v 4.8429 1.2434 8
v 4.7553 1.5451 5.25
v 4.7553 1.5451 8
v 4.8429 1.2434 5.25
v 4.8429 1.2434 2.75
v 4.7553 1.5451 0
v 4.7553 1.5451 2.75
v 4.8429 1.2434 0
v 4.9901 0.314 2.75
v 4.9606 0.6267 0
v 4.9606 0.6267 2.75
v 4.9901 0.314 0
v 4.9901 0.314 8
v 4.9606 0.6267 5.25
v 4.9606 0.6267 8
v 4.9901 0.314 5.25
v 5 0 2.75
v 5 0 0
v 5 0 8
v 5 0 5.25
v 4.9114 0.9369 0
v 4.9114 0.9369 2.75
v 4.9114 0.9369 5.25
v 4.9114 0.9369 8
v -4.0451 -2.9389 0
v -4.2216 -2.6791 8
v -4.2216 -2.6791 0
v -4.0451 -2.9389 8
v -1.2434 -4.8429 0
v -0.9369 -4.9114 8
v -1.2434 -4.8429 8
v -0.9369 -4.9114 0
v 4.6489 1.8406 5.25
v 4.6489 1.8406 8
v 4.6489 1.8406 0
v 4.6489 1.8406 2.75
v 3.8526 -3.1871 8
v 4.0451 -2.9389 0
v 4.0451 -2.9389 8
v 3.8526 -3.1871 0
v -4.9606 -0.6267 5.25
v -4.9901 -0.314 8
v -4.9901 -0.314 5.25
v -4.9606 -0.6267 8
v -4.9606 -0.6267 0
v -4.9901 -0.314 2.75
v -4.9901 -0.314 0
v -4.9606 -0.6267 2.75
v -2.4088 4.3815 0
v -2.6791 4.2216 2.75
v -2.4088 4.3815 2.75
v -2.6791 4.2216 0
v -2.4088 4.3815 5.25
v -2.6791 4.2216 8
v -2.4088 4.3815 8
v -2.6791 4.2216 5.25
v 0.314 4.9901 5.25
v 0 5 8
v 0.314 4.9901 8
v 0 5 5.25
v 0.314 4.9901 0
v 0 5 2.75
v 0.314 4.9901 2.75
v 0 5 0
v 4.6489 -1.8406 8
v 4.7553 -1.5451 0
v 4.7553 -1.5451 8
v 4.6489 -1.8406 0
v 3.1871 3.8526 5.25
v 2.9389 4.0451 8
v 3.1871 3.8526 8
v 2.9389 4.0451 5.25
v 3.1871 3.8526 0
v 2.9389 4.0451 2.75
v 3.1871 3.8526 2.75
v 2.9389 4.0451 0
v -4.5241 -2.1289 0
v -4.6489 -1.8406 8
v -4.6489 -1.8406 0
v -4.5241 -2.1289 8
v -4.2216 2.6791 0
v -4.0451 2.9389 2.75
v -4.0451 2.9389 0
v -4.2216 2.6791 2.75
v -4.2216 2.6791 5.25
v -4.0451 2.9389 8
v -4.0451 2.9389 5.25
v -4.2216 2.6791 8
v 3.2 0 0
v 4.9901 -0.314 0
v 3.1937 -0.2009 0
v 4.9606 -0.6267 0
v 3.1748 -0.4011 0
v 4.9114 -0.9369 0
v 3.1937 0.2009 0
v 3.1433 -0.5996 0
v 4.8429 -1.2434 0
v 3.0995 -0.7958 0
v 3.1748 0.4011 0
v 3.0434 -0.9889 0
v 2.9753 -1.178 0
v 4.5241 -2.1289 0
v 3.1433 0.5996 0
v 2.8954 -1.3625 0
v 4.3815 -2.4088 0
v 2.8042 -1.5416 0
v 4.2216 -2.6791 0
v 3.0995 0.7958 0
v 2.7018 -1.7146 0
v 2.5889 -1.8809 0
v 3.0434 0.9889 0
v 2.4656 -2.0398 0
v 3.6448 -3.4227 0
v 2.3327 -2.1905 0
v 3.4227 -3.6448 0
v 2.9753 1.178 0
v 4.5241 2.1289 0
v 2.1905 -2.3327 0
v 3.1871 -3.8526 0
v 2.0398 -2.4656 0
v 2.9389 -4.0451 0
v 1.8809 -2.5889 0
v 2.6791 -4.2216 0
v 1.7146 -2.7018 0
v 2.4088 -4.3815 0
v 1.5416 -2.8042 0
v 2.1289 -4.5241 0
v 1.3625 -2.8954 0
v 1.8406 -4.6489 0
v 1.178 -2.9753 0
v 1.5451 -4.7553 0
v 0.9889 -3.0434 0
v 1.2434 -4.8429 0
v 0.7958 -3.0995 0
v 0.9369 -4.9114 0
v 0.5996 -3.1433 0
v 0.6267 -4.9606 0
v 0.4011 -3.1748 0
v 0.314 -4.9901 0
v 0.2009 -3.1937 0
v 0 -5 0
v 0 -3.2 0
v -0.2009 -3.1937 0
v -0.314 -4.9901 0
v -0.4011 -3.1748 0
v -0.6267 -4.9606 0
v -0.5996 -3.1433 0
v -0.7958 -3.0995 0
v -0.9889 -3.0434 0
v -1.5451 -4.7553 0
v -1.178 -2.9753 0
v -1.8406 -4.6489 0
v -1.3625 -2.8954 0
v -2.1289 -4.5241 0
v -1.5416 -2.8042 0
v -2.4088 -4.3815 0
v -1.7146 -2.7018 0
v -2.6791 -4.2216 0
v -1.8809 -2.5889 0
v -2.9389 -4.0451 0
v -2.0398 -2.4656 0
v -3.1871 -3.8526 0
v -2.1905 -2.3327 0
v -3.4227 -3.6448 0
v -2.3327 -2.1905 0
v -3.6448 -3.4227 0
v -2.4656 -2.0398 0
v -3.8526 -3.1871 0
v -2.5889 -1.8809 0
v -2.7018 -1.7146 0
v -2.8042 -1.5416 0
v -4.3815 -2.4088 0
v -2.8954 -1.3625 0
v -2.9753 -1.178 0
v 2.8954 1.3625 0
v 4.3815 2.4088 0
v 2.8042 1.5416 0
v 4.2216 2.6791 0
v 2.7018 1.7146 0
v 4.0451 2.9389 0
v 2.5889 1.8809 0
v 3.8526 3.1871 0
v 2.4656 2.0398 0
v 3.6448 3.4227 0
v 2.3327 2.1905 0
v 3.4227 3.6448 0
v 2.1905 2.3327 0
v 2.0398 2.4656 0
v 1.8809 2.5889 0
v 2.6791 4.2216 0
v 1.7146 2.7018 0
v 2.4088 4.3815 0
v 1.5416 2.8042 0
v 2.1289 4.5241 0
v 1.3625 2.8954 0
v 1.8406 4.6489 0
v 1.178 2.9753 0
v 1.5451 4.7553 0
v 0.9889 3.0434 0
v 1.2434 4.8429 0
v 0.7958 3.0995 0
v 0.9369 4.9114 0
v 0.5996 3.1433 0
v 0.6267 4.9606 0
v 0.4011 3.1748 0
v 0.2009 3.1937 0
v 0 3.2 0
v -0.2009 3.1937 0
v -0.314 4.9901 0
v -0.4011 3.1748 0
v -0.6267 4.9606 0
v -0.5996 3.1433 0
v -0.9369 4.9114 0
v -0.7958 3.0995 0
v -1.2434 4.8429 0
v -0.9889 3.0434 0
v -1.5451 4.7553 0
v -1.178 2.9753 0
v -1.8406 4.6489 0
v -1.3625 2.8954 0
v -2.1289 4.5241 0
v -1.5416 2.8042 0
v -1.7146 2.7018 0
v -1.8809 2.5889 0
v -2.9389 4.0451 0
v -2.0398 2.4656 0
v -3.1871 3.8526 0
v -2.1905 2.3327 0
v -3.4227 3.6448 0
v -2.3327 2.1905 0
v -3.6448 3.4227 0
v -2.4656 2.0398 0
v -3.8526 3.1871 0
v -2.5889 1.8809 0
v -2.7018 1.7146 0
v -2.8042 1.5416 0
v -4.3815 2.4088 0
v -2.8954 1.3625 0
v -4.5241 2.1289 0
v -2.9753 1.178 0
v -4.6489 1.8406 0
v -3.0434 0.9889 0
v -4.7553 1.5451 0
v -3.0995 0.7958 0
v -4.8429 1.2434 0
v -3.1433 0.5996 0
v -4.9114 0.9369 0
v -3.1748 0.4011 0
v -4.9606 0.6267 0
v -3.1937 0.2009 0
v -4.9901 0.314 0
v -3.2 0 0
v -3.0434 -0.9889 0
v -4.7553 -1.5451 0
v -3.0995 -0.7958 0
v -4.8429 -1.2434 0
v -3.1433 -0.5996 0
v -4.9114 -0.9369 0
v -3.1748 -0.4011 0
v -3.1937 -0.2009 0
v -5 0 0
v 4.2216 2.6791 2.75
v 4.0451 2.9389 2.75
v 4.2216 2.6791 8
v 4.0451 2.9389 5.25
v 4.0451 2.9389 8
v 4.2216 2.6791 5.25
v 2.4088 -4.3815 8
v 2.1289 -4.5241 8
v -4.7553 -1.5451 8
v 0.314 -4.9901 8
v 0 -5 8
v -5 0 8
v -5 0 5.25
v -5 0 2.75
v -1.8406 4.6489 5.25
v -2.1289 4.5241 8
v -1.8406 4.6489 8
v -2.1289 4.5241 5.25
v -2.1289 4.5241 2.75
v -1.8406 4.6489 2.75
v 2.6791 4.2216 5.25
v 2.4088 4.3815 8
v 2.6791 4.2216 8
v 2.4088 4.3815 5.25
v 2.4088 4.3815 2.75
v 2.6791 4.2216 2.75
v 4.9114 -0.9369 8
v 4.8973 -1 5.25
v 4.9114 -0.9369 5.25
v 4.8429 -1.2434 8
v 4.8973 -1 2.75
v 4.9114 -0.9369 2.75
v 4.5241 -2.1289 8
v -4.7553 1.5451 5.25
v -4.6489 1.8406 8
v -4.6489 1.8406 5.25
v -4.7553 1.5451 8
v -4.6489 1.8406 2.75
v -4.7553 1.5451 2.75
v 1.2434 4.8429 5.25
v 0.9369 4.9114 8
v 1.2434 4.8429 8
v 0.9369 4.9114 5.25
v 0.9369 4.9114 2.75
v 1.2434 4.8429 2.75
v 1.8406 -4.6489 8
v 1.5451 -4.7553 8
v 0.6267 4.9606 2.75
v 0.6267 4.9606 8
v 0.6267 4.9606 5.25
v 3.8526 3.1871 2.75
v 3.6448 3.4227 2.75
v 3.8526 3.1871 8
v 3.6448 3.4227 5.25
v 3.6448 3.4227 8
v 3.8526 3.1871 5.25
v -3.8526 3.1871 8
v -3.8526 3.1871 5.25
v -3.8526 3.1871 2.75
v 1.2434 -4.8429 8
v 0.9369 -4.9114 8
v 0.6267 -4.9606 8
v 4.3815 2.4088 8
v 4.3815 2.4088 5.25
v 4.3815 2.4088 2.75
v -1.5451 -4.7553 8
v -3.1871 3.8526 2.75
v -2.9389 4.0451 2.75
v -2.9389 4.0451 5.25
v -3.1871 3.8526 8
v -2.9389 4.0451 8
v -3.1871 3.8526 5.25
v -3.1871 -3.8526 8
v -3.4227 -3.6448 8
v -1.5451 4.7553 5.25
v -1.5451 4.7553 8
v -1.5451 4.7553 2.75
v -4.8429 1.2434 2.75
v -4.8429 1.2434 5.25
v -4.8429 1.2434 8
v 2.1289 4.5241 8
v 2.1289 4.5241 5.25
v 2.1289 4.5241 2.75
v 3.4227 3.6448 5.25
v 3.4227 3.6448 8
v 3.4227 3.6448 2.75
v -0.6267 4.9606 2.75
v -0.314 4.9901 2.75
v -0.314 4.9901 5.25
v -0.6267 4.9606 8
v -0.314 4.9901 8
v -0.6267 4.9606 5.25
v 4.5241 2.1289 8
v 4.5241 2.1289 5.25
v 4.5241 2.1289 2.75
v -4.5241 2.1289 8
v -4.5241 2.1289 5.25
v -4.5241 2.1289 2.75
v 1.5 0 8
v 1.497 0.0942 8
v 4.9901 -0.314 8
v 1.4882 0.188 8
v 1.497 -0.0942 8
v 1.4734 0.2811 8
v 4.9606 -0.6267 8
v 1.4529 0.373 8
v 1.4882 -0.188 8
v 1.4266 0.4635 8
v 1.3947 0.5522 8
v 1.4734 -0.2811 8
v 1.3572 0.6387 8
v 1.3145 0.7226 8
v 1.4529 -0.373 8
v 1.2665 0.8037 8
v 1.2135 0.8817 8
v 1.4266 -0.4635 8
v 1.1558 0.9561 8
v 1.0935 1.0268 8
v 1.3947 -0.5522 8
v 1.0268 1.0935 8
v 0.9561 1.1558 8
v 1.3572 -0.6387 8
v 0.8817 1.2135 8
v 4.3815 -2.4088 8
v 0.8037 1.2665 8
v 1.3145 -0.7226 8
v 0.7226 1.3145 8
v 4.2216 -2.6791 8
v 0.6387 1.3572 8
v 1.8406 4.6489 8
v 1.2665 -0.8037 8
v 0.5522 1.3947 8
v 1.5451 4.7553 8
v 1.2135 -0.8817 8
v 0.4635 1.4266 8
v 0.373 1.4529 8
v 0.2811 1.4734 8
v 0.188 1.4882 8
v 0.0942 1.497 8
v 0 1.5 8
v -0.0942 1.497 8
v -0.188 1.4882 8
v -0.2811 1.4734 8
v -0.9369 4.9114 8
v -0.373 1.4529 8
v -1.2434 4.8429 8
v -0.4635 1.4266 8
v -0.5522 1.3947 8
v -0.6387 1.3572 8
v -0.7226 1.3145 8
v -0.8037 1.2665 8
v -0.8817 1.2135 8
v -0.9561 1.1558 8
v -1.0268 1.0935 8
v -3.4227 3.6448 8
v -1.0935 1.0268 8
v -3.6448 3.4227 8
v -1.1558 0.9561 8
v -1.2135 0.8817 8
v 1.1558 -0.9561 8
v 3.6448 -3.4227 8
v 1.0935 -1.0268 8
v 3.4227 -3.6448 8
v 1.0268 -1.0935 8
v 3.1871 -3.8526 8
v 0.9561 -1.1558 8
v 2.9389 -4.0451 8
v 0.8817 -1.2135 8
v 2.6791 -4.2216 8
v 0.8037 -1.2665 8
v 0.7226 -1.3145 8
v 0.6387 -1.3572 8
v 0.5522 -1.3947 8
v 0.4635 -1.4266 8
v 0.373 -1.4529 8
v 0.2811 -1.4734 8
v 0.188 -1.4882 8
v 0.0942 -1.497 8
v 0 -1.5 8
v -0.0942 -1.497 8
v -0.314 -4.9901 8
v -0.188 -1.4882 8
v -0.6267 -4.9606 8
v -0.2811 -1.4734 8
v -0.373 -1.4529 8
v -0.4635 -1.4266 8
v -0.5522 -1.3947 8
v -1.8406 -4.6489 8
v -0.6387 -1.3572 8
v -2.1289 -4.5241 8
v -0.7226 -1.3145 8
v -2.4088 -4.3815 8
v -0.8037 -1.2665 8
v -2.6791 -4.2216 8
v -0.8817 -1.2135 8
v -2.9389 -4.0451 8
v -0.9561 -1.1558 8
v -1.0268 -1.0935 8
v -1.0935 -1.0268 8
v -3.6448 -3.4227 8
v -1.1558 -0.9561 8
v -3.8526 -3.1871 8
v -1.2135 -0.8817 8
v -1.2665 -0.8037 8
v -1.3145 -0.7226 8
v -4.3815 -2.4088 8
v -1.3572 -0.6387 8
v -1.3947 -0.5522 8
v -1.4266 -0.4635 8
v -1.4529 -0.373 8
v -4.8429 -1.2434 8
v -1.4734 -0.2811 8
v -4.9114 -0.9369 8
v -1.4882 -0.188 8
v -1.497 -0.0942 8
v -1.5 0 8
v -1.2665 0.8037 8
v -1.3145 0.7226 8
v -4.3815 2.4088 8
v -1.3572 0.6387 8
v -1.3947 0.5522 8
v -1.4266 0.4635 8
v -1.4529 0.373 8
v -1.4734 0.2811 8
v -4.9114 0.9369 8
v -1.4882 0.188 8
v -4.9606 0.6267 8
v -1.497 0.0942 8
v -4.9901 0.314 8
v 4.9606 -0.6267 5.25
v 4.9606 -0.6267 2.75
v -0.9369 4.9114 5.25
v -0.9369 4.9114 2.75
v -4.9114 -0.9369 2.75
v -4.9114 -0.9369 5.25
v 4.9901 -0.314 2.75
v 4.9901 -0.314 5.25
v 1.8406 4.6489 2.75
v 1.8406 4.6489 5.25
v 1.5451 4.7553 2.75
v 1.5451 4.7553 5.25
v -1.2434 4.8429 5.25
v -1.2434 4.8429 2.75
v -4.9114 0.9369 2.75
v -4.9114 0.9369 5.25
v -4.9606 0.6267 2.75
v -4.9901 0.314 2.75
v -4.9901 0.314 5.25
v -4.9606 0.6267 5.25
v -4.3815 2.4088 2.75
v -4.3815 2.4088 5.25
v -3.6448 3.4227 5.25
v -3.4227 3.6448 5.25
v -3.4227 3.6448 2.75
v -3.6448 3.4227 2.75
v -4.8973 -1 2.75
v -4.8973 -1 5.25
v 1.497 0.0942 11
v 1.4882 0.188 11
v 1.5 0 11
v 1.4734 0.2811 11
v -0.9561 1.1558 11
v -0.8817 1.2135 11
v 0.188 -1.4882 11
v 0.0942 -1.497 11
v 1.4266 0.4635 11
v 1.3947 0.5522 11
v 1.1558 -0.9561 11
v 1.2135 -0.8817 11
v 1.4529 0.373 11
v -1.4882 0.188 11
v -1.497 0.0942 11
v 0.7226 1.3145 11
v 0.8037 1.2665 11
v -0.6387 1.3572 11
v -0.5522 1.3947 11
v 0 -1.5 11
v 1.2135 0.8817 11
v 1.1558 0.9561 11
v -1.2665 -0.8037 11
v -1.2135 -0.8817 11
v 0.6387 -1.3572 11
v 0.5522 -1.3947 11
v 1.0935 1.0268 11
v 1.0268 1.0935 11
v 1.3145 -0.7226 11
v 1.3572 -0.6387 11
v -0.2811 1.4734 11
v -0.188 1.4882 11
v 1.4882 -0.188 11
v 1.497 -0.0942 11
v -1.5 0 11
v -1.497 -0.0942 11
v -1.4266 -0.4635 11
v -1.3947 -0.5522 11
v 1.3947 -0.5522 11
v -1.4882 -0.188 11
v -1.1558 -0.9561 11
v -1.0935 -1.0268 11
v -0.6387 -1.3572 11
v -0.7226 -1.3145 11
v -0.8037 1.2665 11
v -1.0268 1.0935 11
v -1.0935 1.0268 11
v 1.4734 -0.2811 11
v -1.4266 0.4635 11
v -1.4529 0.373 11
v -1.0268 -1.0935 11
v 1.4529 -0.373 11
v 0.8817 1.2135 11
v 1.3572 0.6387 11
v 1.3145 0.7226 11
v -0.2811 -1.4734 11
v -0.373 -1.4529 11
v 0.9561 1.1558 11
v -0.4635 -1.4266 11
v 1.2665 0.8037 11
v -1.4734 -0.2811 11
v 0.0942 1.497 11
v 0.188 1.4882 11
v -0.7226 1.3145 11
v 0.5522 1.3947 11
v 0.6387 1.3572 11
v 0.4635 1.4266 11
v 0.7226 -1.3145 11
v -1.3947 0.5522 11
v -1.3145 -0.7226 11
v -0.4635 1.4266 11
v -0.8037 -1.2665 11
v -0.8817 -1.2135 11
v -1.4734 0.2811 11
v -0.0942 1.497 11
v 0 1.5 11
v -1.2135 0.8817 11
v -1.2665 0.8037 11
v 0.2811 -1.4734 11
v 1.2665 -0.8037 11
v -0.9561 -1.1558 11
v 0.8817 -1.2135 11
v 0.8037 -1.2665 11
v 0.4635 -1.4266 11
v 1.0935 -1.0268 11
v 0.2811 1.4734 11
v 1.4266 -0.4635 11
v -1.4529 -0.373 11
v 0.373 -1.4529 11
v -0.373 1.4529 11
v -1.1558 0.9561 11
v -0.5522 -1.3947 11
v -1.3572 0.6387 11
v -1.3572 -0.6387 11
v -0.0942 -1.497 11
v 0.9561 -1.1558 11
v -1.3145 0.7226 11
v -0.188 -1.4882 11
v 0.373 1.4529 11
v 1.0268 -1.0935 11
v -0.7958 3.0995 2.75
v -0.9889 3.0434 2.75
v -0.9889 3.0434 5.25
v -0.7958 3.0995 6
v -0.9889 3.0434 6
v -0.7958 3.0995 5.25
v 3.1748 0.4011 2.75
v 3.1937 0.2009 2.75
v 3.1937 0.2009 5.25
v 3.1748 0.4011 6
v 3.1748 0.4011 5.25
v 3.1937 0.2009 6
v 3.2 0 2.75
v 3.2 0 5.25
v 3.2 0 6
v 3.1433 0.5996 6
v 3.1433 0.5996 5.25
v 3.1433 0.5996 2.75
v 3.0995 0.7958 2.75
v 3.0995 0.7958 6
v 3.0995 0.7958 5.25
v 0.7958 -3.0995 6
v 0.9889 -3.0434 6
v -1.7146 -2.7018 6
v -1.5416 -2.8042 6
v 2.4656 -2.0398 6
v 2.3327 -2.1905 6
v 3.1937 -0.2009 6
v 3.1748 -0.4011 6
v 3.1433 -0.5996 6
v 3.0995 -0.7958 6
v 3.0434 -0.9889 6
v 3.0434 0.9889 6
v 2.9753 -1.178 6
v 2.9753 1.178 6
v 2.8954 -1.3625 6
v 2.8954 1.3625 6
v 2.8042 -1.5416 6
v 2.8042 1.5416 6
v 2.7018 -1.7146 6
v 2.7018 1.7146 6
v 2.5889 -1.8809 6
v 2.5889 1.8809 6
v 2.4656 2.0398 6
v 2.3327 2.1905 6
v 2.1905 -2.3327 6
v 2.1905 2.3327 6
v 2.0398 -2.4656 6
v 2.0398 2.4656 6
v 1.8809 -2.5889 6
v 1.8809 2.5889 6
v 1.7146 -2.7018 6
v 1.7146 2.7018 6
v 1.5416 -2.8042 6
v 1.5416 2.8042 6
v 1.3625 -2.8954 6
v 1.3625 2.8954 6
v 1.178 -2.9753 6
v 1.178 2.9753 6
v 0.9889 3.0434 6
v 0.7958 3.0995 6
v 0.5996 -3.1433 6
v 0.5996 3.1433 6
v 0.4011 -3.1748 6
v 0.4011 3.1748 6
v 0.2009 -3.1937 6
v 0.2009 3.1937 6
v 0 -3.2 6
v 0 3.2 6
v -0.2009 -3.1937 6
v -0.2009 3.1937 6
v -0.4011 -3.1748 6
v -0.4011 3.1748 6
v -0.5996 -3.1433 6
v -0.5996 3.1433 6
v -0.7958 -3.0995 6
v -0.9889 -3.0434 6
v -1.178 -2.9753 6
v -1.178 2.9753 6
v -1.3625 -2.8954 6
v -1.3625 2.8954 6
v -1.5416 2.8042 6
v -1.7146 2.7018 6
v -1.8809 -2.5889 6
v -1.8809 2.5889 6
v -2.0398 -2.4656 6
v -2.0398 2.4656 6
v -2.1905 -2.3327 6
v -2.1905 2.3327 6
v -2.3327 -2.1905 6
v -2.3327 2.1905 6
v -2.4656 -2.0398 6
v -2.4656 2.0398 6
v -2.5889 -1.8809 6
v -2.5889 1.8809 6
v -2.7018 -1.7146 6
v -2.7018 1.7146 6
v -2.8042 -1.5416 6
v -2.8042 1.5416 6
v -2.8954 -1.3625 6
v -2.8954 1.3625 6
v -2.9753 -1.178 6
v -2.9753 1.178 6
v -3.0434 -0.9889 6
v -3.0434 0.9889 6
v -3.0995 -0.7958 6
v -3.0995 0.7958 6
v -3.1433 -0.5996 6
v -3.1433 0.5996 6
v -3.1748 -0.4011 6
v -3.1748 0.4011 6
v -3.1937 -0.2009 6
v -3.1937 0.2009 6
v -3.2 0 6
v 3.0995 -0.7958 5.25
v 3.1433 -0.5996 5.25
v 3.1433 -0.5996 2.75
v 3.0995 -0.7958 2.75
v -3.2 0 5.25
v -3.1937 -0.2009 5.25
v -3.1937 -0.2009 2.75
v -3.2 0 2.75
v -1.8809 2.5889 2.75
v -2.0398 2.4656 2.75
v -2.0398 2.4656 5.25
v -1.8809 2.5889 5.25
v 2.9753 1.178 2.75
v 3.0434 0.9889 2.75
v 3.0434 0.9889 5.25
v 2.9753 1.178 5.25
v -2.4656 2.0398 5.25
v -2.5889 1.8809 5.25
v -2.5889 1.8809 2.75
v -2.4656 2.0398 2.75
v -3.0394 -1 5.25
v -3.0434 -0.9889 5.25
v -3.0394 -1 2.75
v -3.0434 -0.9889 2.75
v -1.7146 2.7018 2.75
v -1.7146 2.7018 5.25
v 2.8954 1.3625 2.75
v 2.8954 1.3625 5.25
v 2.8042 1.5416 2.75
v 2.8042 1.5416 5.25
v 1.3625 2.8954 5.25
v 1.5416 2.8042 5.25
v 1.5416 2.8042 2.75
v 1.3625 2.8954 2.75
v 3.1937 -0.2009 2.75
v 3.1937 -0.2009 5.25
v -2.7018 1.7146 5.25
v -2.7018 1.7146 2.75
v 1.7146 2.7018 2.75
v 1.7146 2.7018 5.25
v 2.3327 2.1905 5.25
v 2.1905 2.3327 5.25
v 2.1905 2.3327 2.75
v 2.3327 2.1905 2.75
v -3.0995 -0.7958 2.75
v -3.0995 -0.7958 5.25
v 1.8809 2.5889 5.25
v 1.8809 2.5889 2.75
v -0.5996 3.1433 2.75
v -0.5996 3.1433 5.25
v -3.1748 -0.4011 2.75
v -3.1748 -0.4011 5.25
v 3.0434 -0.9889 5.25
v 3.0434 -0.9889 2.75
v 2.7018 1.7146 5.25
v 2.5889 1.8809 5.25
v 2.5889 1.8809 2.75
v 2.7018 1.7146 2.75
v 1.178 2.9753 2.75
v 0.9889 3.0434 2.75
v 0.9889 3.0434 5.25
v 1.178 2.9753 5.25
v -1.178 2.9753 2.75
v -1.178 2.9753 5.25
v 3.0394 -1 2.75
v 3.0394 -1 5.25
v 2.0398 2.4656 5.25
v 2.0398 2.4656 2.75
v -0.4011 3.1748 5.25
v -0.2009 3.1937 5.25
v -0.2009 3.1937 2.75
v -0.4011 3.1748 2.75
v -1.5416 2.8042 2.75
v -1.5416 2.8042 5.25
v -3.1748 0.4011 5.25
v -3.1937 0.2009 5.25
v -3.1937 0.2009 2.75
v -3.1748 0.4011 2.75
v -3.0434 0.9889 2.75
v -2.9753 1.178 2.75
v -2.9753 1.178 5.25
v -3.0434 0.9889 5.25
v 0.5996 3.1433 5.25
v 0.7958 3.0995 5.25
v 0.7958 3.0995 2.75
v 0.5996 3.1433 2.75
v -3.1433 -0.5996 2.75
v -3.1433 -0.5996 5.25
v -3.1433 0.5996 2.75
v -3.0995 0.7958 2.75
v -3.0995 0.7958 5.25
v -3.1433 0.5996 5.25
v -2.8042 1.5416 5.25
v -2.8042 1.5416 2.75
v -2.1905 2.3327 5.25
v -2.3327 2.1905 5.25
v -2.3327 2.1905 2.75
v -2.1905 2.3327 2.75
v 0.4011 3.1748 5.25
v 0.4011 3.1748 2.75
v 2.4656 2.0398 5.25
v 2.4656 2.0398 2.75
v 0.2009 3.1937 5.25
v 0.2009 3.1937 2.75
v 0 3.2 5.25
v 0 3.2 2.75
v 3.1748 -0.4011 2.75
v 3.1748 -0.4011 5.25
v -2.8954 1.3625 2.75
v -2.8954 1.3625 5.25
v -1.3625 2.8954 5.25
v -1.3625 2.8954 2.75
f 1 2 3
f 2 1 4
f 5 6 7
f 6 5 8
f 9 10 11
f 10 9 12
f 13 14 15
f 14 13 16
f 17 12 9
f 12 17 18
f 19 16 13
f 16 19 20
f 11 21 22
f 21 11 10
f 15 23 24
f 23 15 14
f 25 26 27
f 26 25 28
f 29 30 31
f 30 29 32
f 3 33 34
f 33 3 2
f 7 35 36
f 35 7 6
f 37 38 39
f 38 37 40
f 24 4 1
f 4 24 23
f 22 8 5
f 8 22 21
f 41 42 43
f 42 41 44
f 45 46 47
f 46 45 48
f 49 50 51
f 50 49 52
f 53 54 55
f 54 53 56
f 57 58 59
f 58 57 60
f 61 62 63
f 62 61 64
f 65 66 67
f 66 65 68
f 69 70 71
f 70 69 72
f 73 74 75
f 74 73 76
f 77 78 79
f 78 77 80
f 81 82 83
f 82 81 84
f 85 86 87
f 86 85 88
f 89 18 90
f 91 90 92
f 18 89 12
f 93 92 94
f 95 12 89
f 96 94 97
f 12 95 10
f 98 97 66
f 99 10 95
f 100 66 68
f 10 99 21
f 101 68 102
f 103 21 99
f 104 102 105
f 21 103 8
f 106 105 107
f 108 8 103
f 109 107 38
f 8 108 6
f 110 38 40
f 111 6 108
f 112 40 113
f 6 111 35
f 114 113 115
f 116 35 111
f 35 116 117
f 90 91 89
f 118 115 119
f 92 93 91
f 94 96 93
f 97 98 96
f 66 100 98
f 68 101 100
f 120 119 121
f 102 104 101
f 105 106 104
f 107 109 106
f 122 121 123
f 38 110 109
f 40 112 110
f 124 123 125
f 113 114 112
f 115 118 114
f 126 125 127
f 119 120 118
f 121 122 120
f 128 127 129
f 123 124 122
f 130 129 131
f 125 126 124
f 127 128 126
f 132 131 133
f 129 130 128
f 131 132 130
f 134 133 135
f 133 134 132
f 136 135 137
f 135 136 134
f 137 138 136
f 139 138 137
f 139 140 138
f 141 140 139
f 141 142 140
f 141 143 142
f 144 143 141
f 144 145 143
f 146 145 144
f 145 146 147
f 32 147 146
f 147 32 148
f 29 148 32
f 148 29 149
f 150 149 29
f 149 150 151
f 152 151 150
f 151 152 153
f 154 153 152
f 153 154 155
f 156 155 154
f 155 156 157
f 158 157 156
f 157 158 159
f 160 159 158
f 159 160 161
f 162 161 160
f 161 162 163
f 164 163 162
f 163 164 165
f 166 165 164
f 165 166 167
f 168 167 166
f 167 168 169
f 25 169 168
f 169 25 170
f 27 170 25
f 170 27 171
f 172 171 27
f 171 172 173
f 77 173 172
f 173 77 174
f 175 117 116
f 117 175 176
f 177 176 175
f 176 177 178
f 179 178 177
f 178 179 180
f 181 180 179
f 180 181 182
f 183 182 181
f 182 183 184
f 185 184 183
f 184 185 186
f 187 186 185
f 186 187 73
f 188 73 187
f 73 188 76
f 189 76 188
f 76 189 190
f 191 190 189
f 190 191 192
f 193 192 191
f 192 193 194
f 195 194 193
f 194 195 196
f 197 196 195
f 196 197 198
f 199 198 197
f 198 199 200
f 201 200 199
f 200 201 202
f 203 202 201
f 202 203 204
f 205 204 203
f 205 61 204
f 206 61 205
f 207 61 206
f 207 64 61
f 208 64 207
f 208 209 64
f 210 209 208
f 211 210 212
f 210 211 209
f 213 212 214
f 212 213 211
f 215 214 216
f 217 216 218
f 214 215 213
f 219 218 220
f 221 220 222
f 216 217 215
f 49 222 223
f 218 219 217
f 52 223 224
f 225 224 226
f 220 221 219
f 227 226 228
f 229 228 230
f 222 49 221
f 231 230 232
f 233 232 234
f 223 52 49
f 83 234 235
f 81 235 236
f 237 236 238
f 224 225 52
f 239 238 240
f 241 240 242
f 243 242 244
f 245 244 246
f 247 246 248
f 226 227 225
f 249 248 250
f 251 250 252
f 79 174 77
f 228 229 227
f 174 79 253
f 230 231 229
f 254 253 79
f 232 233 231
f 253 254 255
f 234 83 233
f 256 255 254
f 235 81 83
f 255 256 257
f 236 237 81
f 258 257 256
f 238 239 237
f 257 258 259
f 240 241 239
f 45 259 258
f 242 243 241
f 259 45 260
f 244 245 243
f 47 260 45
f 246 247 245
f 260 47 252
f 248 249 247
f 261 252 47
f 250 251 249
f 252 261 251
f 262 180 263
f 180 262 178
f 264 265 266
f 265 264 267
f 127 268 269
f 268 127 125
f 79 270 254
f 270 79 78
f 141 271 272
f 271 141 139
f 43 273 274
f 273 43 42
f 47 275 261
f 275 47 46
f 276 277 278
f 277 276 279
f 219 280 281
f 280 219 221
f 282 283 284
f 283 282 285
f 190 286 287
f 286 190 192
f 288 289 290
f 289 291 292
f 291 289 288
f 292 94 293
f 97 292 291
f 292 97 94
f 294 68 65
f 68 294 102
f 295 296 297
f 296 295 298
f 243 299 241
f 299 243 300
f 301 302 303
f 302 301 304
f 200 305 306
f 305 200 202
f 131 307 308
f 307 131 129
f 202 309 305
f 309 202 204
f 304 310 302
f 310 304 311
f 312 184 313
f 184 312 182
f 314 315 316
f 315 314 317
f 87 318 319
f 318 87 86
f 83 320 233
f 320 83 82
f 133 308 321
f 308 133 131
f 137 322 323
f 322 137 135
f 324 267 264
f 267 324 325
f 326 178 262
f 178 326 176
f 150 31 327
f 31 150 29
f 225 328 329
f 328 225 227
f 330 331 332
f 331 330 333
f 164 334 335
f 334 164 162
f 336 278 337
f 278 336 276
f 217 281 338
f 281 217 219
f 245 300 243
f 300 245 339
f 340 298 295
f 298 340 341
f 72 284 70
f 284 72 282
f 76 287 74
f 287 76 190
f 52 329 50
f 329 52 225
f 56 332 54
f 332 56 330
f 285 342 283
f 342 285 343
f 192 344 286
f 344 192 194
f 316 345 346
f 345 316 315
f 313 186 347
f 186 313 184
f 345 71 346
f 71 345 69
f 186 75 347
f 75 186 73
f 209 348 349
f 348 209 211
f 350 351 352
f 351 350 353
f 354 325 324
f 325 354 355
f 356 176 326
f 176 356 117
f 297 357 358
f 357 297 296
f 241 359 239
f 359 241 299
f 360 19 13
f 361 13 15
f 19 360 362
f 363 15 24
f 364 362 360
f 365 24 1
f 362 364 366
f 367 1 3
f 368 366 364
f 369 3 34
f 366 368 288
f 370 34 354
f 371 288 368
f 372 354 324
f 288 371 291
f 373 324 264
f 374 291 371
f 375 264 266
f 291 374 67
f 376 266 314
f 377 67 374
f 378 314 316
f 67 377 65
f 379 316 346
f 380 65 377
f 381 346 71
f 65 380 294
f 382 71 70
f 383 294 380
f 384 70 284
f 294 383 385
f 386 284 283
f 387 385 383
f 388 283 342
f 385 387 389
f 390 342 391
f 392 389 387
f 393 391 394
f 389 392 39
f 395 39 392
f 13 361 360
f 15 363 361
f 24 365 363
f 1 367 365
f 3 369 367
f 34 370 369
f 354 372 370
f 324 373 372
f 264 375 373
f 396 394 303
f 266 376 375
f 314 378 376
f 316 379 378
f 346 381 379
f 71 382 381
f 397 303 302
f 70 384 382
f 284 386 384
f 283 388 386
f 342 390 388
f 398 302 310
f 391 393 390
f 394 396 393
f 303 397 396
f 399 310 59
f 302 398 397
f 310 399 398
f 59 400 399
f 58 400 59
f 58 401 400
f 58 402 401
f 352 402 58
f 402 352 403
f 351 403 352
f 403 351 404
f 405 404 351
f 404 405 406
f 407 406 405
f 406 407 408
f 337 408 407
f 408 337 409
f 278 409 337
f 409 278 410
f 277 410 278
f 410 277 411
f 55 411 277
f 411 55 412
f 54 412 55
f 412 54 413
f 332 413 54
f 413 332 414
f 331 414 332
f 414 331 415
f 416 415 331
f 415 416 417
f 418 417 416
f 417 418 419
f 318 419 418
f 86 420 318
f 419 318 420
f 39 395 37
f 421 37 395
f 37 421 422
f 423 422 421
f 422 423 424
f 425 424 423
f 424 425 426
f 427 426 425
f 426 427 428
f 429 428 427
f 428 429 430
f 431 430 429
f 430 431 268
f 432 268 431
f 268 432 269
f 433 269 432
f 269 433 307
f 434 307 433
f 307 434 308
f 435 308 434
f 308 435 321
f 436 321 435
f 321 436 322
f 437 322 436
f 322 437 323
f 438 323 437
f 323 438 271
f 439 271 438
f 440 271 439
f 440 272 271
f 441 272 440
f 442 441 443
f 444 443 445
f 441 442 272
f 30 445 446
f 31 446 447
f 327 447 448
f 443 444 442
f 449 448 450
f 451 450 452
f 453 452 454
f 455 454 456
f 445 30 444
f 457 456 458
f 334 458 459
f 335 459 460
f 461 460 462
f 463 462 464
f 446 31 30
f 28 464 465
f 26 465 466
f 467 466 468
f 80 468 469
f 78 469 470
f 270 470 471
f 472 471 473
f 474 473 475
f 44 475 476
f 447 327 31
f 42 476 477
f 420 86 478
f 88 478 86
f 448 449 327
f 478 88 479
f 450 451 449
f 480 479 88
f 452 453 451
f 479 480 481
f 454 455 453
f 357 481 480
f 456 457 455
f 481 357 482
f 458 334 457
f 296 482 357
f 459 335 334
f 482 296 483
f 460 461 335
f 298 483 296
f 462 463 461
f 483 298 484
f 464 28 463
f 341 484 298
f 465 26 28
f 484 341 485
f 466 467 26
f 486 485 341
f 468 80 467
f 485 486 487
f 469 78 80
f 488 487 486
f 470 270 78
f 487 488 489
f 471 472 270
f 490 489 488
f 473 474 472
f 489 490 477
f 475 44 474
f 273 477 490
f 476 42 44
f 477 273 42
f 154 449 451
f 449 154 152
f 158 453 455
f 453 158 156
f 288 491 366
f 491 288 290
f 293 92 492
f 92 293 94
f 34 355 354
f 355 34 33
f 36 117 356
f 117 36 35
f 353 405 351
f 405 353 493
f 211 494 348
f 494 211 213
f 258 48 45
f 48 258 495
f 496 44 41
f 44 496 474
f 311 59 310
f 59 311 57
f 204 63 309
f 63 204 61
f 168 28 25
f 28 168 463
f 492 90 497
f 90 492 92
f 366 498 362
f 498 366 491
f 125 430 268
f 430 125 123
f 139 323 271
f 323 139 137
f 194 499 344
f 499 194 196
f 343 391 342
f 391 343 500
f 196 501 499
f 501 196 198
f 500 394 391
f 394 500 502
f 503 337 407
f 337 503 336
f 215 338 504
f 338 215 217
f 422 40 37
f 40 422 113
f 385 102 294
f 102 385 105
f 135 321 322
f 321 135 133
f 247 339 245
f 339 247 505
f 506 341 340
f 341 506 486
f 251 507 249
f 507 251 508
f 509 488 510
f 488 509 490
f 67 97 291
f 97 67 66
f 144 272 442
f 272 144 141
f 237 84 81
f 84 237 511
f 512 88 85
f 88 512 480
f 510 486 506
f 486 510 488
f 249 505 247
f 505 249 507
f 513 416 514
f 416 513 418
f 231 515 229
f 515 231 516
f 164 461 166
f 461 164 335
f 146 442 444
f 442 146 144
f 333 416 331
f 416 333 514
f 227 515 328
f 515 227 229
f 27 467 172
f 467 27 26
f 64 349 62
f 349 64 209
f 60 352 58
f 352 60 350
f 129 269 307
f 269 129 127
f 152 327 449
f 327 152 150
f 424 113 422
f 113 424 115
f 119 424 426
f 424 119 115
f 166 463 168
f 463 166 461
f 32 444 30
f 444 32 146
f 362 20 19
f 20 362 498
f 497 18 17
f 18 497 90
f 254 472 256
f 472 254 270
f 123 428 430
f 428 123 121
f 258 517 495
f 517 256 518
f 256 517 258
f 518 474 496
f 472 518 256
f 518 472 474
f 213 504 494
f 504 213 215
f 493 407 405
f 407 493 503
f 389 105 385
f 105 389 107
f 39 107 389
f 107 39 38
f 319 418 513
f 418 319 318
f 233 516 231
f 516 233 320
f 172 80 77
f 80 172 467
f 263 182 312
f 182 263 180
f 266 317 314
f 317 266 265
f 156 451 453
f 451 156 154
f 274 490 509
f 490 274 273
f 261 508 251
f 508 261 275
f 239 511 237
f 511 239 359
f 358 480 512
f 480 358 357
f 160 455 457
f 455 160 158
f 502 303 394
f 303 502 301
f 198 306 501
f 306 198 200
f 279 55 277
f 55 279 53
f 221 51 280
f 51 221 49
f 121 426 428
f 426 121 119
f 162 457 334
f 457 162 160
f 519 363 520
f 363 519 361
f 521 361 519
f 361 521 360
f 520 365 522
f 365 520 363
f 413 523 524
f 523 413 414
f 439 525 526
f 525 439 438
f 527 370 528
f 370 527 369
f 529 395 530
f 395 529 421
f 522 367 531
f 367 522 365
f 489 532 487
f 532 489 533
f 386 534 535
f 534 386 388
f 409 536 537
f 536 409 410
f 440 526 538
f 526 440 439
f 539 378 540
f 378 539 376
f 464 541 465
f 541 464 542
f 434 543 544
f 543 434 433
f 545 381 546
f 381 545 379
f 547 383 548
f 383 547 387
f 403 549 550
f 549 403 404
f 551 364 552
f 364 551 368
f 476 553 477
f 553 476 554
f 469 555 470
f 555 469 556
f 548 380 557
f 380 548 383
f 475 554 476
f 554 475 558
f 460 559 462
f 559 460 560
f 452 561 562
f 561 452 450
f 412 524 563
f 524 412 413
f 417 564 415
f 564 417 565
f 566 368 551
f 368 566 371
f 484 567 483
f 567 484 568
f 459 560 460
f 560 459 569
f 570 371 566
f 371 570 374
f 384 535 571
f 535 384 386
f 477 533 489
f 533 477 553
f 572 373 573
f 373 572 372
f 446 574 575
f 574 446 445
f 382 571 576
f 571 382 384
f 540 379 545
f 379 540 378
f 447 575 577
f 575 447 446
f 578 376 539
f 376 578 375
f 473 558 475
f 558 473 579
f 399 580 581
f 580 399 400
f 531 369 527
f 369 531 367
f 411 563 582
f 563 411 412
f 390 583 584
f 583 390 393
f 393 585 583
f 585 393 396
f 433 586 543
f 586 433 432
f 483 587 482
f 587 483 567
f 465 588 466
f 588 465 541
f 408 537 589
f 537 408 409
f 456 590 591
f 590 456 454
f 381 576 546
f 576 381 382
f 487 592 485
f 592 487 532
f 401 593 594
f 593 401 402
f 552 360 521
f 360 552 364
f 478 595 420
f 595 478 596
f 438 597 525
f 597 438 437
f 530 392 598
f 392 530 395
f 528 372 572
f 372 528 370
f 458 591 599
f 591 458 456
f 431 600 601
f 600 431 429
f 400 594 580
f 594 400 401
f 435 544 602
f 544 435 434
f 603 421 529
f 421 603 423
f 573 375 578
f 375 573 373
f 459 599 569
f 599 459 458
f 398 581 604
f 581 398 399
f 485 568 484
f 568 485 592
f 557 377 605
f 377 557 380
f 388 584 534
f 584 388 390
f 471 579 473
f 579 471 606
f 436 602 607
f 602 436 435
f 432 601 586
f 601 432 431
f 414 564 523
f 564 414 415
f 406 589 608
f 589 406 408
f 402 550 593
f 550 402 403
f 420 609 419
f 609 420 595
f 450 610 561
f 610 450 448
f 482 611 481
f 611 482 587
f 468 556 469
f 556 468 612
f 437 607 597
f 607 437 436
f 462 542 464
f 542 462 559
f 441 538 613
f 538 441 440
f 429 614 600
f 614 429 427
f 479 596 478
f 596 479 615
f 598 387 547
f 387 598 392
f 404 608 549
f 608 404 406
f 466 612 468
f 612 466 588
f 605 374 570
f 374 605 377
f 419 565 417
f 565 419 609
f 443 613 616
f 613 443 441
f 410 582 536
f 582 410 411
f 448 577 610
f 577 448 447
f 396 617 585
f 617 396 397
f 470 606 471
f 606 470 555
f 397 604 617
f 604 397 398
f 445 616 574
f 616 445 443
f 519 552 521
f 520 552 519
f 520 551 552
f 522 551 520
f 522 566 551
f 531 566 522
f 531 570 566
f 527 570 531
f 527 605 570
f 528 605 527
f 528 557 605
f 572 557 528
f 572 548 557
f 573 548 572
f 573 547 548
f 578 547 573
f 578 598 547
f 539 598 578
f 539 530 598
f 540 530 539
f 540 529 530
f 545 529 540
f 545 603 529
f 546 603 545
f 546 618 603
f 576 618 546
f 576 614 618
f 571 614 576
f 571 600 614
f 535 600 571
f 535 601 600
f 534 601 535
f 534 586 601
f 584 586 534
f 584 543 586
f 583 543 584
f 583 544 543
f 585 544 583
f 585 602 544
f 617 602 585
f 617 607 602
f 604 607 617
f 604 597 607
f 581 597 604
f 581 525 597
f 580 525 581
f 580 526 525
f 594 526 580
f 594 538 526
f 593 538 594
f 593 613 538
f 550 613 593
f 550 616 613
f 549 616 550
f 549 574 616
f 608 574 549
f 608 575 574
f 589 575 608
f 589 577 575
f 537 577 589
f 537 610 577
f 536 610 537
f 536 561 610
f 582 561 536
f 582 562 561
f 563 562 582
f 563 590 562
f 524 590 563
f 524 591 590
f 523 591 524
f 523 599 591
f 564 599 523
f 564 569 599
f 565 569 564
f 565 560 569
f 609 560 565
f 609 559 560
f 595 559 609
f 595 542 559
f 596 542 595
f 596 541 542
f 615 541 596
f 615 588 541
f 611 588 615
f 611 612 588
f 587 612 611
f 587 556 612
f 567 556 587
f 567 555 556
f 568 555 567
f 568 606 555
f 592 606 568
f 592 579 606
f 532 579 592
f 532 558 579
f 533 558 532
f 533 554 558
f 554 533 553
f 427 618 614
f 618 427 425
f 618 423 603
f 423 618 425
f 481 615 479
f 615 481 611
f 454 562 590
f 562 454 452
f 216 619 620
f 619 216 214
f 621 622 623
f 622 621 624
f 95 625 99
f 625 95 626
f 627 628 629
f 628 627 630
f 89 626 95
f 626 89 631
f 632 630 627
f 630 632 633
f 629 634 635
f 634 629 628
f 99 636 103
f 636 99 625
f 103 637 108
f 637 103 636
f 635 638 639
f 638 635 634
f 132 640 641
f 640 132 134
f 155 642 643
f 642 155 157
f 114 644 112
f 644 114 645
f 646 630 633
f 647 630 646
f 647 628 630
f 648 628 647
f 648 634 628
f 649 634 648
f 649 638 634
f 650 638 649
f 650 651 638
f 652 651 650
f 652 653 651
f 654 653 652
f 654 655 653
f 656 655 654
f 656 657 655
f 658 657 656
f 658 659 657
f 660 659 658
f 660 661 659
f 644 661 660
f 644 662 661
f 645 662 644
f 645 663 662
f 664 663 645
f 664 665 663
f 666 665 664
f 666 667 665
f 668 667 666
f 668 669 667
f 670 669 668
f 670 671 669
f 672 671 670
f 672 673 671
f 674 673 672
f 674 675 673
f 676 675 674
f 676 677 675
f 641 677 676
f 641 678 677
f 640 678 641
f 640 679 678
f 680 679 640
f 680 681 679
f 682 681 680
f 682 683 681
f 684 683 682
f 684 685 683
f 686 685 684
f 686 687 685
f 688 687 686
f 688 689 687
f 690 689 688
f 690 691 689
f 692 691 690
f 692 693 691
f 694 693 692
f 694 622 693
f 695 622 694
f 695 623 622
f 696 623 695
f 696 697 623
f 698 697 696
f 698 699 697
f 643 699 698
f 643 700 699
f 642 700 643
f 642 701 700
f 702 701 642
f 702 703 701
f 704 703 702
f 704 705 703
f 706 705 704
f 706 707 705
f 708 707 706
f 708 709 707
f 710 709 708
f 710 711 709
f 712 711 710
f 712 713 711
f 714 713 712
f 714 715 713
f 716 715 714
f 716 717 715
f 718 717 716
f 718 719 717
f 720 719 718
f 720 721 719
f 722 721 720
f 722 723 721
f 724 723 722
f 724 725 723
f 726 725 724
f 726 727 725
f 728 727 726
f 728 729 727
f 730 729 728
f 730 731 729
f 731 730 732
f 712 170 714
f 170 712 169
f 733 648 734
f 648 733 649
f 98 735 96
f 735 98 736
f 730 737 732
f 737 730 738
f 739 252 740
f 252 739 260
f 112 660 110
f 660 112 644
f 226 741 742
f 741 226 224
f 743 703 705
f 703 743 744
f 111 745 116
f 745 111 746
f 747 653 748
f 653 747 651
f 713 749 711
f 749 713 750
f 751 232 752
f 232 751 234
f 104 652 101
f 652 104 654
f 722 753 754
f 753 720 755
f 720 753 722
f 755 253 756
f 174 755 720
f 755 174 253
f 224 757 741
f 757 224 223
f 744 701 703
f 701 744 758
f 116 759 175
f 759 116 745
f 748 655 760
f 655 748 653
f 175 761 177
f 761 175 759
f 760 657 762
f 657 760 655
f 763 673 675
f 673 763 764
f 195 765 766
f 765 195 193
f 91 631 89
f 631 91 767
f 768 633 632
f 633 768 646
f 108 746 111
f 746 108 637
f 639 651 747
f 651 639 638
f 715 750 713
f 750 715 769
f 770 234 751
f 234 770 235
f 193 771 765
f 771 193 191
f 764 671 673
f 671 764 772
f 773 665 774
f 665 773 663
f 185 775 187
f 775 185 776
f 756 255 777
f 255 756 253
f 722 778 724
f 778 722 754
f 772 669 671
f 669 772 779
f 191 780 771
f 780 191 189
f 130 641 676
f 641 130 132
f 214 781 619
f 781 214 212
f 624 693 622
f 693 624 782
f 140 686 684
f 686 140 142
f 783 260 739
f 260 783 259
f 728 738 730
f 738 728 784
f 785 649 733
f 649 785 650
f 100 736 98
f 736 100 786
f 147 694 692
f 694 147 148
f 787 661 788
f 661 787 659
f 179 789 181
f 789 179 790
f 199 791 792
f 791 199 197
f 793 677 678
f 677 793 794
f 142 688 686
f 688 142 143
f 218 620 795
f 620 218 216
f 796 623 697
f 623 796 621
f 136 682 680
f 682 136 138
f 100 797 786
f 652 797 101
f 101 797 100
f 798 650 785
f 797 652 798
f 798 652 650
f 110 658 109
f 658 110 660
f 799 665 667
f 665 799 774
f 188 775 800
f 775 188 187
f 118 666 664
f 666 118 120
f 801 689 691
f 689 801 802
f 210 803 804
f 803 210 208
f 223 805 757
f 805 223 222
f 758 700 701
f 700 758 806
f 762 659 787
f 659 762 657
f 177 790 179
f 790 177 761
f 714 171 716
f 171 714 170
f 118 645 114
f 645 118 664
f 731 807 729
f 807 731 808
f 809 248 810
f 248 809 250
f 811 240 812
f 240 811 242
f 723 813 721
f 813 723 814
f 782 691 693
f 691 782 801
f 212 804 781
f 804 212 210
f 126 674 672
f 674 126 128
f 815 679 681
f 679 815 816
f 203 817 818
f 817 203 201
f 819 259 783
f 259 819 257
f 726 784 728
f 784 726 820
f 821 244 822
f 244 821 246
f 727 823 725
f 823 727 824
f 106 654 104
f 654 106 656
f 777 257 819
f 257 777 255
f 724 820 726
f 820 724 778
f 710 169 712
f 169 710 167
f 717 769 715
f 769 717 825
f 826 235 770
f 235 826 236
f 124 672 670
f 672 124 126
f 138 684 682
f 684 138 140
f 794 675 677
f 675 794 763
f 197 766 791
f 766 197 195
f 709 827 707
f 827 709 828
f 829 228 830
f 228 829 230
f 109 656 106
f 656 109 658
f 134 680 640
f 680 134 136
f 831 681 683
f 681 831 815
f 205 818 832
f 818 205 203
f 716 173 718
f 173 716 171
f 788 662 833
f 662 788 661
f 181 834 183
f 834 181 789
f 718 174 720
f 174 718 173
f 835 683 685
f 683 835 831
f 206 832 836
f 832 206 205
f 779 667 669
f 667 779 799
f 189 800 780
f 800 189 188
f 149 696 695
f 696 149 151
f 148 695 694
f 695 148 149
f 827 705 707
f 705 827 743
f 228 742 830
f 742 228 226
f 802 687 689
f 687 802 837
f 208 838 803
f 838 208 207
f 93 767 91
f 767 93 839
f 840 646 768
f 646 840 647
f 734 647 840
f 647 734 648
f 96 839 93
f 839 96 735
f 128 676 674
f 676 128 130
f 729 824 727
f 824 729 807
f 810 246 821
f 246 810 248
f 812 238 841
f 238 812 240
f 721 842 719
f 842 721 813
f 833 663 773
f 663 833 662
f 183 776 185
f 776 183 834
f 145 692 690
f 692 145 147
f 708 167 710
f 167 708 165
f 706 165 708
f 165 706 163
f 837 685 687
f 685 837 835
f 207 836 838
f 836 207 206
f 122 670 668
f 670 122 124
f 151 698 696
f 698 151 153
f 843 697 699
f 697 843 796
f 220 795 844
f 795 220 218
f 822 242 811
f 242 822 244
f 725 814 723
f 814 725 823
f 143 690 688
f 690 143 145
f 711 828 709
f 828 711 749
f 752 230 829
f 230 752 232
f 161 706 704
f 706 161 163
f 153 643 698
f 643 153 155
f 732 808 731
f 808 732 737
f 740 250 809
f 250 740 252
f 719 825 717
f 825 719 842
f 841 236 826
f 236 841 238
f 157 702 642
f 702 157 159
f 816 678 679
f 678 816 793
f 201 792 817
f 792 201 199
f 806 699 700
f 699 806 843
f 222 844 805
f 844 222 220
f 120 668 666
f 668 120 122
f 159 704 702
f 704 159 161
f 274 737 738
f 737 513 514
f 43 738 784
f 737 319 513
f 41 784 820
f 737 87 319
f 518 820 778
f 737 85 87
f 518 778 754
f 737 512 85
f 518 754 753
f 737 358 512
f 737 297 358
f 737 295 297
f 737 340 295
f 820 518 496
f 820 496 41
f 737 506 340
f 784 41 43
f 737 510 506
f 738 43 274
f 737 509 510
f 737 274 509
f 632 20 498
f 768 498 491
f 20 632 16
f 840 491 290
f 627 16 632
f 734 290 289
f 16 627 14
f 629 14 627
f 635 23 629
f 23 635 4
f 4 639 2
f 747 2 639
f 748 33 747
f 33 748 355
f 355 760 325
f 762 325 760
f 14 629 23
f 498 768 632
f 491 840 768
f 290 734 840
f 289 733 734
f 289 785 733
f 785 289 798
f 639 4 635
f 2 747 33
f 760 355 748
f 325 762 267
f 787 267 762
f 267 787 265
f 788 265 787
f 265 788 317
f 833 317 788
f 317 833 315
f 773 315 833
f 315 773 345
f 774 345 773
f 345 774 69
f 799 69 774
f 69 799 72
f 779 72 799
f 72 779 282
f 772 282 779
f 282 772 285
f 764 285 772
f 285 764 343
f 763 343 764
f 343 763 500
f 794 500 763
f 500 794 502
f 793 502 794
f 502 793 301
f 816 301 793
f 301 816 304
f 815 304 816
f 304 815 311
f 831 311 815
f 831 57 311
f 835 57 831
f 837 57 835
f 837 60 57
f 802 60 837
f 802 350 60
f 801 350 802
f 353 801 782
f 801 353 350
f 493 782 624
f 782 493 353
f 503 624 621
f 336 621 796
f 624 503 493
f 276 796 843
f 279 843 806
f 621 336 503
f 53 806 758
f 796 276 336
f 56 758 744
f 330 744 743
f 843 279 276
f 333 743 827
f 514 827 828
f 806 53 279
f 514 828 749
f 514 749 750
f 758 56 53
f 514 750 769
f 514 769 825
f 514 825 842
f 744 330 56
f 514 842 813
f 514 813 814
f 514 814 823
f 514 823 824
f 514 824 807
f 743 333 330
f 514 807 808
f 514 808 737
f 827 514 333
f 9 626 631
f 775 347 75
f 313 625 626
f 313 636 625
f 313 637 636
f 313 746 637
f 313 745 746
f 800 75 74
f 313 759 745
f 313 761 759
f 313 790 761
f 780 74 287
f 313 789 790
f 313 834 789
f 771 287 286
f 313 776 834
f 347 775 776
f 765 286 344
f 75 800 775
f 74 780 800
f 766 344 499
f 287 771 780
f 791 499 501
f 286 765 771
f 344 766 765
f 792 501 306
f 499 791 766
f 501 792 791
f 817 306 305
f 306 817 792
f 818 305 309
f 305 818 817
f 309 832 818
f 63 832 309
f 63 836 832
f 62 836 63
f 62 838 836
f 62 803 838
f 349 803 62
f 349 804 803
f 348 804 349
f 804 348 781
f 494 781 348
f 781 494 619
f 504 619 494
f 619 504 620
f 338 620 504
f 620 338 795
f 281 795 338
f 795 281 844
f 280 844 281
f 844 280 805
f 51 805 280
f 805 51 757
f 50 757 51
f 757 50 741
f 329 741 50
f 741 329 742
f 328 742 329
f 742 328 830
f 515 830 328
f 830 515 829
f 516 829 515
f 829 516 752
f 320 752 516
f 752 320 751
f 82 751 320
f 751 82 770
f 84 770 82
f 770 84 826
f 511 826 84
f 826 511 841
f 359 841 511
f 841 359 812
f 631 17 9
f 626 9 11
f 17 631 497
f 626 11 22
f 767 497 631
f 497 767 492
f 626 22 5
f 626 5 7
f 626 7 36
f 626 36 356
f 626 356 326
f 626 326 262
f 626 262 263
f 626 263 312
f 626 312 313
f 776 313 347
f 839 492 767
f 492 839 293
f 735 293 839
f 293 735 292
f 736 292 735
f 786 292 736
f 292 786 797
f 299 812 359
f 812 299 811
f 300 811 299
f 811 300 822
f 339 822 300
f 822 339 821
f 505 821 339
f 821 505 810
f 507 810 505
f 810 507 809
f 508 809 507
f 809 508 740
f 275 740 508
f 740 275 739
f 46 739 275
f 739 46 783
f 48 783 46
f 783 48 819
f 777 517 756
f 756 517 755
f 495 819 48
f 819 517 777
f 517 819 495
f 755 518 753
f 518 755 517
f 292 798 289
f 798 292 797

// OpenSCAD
/*
	
	1/10 Scale RC Car Body Post Marker(s)

*/

//$fn=23;
$fn=100;

gMS=2.0;
gSpace=0.2+0.2;
gMagnetDiaOuter=6; /* I used magnets I found on eBay, they are 6x3x3 and about 8€ for 20 pcs */
gMagnetDiaInner=3;
gMagnetHeight=3;
gPostDia=6.0; /* Adjust this to the posts of your car */
gConnectorDia=gPostDia+2*gMS;
gHeight=8;


		difference()
		{
			/* This Marker's Post Thing */
			union()
			{
				cylinder(d=gConnectorDia, h=gHeight);

				/* Holder for magnet */
				cylinder(d=gMagnetDiaInner, h=gHeight+gMagnetHeight);
			}
			
			/* Room for car's post */
			cylinder(d=gPostDia+gSpace, h=gHeight-gMS);
			
			/* room for pin */
			translate([0, 23/2-1, 4])
			cube([23, 23, 2.5], center=true);
			
			/* Holes for pins, set screw, or whatever */
			if(0)
			for (sh=[5:7:21])
			translate([0, 0, sh])
			rotate([0, 90, 0])
			cylinder(d=gSetscrewDia, h=42, center=true);

		} // diff
